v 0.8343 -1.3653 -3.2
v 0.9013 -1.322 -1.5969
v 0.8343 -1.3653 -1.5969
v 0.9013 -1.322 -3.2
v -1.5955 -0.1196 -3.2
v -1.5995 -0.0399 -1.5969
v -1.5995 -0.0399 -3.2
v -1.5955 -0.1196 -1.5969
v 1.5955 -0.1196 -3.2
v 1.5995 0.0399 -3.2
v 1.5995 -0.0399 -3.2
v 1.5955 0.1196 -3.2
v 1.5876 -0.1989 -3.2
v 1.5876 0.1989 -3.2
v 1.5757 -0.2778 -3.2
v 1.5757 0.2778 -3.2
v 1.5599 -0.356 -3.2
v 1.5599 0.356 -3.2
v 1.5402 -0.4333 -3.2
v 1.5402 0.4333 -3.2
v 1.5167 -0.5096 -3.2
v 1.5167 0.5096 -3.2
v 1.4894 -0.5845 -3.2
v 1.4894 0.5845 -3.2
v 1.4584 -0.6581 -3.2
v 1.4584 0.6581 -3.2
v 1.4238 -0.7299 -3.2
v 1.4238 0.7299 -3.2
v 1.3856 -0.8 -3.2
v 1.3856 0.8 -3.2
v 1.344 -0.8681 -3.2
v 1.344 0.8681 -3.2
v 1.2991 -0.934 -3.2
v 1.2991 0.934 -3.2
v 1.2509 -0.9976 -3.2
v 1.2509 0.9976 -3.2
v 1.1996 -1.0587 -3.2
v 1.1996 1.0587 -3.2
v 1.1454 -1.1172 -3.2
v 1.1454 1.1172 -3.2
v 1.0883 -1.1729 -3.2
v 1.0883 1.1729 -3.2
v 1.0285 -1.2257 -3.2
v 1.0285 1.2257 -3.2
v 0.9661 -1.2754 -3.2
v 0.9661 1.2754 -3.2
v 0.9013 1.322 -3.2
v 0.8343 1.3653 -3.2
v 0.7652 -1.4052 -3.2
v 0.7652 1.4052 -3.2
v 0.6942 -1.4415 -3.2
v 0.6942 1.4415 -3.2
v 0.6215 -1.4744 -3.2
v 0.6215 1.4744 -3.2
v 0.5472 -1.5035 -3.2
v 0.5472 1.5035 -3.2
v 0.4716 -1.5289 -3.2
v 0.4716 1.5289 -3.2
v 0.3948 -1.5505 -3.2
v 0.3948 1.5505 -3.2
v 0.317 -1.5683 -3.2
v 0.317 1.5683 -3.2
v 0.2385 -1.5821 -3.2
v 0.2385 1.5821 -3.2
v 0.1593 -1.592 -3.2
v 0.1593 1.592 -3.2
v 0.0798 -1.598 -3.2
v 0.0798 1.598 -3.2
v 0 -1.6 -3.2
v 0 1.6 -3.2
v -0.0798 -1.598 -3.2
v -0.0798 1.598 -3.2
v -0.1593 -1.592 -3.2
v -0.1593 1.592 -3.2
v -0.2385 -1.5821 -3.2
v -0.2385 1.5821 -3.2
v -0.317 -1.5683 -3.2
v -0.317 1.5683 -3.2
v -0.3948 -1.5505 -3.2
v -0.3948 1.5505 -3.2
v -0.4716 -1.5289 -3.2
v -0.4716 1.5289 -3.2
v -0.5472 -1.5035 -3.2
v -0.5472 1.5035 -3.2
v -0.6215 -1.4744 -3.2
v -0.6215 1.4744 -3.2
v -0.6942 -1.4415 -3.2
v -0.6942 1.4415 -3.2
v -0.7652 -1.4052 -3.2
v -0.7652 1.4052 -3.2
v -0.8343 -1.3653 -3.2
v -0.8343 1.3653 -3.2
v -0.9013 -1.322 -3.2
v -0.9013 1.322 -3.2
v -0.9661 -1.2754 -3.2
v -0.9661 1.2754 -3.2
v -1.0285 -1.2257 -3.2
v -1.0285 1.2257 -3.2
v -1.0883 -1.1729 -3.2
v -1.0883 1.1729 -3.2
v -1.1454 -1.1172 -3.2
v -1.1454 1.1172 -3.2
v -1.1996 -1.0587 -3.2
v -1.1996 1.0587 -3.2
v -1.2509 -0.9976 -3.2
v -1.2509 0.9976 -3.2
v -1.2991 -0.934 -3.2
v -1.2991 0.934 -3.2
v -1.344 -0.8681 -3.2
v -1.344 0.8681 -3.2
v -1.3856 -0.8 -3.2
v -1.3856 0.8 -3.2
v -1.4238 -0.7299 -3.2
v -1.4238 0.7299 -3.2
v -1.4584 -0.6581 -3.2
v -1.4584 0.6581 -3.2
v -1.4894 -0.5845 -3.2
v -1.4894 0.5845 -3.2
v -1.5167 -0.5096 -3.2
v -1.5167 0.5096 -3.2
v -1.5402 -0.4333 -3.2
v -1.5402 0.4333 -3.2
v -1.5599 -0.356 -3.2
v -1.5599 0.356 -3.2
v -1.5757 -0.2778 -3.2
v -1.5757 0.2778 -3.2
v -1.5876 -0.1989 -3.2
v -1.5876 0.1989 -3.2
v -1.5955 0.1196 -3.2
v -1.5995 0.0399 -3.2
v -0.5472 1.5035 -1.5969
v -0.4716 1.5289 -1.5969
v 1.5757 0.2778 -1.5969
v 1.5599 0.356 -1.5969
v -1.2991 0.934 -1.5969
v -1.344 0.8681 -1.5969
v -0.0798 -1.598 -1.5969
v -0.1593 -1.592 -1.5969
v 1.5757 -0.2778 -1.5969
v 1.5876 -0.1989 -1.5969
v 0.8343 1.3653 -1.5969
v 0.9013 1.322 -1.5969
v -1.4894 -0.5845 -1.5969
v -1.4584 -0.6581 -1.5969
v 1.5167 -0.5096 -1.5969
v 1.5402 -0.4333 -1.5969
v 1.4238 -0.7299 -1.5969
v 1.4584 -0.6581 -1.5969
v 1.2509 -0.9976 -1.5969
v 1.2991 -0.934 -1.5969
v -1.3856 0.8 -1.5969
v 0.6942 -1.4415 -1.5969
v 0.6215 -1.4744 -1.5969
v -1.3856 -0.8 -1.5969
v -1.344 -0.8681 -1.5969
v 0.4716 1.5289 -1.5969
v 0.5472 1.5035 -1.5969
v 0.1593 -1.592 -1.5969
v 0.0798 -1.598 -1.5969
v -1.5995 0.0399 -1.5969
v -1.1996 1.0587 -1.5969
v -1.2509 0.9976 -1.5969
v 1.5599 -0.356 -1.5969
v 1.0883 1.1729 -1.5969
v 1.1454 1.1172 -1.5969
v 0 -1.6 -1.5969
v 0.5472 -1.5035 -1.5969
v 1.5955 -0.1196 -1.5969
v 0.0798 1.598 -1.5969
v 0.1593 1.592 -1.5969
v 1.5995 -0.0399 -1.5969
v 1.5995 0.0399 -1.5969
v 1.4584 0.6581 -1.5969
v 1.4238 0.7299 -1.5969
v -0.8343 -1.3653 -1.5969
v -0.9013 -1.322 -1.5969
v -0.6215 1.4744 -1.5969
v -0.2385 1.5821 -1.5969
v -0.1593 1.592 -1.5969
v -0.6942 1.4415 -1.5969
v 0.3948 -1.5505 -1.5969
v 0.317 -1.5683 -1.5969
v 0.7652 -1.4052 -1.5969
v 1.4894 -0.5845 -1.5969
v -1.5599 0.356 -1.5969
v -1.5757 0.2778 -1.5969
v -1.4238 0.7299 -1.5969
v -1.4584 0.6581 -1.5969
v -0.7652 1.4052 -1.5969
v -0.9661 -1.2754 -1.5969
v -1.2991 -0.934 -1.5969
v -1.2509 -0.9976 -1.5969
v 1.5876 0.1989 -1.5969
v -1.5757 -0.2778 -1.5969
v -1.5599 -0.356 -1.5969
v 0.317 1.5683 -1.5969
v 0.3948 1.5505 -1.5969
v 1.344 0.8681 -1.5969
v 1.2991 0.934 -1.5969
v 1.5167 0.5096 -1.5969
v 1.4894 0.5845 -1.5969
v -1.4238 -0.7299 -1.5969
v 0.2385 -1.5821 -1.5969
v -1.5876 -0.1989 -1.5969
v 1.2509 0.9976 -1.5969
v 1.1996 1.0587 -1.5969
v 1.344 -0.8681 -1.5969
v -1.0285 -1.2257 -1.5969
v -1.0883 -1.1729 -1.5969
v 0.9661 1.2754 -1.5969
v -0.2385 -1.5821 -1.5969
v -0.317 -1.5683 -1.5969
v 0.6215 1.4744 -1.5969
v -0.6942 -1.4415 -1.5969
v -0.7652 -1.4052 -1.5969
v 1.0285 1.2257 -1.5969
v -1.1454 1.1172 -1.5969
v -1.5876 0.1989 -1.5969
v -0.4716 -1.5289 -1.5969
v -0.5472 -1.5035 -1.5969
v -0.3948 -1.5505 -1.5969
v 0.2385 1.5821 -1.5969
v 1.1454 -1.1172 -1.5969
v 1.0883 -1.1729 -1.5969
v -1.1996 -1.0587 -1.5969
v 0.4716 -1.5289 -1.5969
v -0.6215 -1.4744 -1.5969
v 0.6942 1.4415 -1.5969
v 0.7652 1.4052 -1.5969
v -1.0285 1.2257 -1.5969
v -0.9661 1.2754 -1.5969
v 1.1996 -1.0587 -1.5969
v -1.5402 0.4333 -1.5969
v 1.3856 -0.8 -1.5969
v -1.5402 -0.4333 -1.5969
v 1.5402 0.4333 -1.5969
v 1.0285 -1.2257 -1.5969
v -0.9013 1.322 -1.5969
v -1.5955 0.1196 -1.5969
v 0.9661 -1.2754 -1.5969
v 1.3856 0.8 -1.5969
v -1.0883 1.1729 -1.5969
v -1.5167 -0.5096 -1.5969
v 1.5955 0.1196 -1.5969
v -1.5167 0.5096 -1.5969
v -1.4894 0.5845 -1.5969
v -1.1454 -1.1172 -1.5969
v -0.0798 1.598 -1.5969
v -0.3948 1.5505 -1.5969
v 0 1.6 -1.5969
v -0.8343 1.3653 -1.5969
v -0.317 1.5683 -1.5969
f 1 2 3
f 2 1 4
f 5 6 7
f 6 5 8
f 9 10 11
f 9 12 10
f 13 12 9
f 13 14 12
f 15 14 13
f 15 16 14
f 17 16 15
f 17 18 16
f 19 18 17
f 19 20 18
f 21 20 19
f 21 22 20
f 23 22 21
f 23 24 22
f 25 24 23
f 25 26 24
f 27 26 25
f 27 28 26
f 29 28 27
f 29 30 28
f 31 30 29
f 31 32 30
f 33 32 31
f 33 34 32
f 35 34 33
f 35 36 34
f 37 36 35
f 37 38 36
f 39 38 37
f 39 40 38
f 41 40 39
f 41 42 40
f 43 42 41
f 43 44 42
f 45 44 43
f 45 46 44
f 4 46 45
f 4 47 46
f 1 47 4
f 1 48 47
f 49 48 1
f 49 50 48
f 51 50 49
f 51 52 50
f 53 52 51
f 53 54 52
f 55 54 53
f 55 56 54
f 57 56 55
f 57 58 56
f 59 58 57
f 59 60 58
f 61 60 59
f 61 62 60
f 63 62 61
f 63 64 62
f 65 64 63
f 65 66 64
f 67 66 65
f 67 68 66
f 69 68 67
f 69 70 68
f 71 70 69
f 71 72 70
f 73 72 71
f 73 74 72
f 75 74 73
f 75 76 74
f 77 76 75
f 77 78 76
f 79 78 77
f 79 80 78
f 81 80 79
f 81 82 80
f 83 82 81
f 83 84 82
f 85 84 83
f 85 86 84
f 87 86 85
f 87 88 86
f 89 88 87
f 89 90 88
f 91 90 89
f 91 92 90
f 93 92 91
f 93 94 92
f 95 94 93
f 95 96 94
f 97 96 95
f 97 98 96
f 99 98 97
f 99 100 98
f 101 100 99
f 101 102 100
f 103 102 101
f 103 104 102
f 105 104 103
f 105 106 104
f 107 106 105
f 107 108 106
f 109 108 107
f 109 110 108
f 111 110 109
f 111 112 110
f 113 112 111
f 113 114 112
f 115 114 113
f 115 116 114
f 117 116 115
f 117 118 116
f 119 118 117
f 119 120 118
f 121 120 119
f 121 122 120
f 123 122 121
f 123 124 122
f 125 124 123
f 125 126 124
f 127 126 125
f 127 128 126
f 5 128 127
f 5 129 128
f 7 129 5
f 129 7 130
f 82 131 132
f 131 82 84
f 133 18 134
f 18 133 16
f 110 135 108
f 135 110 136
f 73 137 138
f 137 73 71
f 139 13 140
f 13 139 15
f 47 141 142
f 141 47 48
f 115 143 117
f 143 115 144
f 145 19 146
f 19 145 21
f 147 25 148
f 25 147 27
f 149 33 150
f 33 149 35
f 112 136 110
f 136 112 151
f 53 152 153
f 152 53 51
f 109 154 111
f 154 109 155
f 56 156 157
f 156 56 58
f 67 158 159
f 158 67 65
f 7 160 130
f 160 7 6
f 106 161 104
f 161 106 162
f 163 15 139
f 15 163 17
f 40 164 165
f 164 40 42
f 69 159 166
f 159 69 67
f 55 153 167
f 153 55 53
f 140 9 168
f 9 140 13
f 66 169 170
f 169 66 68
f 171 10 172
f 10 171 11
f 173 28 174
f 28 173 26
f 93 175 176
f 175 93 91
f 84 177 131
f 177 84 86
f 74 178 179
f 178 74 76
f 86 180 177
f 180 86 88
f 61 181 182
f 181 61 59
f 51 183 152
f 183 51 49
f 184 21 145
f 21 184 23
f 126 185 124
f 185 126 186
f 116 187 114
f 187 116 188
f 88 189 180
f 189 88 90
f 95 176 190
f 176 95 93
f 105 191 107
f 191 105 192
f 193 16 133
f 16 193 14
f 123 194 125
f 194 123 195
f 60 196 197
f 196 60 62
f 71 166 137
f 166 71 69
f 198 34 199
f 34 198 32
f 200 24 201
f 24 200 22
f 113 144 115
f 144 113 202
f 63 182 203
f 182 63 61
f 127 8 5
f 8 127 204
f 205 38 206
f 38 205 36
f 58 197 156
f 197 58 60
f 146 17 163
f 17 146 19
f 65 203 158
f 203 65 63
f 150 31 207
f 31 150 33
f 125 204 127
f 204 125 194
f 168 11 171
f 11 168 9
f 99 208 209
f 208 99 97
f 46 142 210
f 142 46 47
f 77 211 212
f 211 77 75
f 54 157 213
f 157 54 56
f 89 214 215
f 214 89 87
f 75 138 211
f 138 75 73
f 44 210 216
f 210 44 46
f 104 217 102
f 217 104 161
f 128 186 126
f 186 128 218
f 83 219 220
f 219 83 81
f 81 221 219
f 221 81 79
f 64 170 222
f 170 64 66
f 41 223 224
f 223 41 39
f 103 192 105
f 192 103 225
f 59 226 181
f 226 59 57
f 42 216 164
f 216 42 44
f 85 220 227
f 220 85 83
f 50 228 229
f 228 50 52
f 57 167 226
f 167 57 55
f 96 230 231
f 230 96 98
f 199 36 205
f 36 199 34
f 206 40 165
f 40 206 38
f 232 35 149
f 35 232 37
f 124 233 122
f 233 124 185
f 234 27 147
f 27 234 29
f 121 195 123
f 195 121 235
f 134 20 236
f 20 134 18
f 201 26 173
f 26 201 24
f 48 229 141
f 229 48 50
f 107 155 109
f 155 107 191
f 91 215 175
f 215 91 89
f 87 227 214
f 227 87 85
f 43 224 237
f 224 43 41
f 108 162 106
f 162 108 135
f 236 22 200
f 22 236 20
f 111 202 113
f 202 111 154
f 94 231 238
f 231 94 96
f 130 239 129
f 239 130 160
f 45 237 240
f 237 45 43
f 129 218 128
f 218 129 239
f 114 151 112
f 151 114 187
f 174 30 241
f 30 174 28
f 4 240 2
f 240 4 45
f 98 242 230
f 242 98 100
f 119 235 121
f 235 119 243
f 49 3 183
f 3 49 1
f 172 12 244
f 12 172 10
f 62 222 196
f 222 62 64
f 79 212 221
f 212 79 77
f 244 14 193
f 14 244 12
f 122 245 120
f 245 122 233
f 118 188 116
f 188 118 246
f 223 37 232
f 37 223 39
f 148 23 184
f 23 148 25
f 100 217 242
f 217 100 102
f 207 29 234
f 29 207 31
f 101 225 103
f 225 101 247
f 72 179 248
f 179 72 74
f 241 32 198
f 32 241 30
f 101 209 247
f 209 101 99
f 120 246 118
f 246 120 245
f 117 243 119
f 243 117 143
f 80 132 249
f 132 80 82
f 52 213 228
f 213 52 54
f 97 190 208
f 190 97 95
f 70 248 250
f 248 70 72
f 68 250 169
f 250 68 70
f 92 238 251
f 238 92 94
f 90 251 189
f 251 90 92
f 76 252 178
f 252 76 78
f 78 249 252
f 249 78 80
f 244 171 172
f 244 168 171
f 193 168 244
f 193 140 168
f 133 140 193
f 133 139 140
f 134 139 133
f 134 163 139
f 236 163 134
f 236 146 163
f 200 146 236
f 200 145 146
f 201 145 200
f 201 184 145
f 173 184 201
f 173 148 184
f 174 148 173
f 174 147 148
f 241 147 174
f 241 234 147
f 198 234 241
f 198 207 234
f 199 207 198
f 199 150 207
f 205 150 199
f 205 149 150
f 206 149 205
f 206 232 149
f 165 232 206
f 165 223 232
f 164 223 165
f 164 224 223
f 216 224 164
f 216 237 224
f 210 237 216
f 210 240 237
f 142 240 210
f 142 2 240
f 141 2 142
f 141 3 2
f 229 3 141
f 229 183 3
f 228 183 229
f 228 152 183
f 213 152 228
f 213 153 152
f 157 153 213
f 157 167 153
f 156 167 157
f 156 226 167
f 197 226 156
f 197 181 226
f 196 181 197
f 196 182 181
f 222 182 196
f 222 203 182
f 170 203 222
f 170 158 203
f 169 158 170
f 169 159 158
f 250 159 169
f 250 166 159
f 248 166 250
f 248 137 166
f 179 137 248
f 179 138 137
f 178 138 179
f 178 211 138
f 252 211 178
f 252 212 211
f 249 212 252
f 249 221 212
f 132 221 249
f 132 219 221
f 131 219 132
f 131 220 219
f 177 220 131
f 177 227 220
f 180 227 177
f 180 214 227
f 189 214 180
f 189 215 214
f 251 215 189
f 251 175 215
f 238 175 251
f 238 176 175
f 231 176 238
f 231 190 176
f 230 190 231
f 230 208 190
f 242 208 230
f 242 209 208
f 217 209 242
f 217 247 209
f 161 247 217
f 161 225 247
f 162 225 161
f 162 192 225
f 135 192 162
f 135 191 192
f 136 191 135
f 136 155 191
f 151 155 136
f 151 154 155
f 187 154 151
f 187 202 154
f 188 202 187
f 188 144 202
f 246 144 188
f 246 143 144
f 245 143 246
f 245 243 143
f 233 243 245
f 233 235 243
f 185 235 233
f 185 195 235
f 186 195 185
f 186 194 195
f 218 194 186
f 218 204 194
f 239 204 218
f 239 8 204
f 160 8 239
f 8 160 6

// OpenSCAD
use <../lib.scad>
use <814.scad>
use <815c02.scad>
$fa=1; $fs=0.2;
function ldraw_lib__814c02_f1(realsolid=false) = [
// 0 Train Level Crossing Gate Type 1 - Base with White/Red Crossbar Right Closed (Complete)
// 0 Name: 814c02-f1.dat
// 0 Author: Steffen [Steffen]
// 0 !LDRAW_ORG Shortcut UPDATE 2017-01
// 0 !LICENSE Licensed under CC BY 2.0 and CC BY 4.0 : see CAreadme.txt
// 
// 0 BFC CERTIFY CCW
  [0,"BFC","CERTIFY"],
  [0,"BFC","CCW"],
// 
// 0 !CMDLINE -c1
// 
// 0 !HISTORY 2017-12-30 [PTadmin] Official Update 2017-01
// 
// 
// 1 16 0 0 0 1 0 0 0 1 0 0 0 1 814.dat
  [1,16,0,0,0,1,0,0,0,1,0,0,0,1, ldraw_lib__814(realsolid)],
// 1 15 0 -28 0 1 0 0 0 1 0 0 0 1 815c02.dat
  [1,15,0,-28,0,1,0,0,0,1,0,0,0,1, ldraw_lib__815c02(realsolid)],
];
module ldraw_lib__814c02_f1(step=0, col=false, unit=2/5, alt=false, line=0.2, solid=!$preview)
    makepoly(ldraw_lib__814c02_f1(solid), step=step, col=col, unit=unit, alt=alt, line=line, solid=solid);
ldraw_lib__814c02_f1(line=0.2);
